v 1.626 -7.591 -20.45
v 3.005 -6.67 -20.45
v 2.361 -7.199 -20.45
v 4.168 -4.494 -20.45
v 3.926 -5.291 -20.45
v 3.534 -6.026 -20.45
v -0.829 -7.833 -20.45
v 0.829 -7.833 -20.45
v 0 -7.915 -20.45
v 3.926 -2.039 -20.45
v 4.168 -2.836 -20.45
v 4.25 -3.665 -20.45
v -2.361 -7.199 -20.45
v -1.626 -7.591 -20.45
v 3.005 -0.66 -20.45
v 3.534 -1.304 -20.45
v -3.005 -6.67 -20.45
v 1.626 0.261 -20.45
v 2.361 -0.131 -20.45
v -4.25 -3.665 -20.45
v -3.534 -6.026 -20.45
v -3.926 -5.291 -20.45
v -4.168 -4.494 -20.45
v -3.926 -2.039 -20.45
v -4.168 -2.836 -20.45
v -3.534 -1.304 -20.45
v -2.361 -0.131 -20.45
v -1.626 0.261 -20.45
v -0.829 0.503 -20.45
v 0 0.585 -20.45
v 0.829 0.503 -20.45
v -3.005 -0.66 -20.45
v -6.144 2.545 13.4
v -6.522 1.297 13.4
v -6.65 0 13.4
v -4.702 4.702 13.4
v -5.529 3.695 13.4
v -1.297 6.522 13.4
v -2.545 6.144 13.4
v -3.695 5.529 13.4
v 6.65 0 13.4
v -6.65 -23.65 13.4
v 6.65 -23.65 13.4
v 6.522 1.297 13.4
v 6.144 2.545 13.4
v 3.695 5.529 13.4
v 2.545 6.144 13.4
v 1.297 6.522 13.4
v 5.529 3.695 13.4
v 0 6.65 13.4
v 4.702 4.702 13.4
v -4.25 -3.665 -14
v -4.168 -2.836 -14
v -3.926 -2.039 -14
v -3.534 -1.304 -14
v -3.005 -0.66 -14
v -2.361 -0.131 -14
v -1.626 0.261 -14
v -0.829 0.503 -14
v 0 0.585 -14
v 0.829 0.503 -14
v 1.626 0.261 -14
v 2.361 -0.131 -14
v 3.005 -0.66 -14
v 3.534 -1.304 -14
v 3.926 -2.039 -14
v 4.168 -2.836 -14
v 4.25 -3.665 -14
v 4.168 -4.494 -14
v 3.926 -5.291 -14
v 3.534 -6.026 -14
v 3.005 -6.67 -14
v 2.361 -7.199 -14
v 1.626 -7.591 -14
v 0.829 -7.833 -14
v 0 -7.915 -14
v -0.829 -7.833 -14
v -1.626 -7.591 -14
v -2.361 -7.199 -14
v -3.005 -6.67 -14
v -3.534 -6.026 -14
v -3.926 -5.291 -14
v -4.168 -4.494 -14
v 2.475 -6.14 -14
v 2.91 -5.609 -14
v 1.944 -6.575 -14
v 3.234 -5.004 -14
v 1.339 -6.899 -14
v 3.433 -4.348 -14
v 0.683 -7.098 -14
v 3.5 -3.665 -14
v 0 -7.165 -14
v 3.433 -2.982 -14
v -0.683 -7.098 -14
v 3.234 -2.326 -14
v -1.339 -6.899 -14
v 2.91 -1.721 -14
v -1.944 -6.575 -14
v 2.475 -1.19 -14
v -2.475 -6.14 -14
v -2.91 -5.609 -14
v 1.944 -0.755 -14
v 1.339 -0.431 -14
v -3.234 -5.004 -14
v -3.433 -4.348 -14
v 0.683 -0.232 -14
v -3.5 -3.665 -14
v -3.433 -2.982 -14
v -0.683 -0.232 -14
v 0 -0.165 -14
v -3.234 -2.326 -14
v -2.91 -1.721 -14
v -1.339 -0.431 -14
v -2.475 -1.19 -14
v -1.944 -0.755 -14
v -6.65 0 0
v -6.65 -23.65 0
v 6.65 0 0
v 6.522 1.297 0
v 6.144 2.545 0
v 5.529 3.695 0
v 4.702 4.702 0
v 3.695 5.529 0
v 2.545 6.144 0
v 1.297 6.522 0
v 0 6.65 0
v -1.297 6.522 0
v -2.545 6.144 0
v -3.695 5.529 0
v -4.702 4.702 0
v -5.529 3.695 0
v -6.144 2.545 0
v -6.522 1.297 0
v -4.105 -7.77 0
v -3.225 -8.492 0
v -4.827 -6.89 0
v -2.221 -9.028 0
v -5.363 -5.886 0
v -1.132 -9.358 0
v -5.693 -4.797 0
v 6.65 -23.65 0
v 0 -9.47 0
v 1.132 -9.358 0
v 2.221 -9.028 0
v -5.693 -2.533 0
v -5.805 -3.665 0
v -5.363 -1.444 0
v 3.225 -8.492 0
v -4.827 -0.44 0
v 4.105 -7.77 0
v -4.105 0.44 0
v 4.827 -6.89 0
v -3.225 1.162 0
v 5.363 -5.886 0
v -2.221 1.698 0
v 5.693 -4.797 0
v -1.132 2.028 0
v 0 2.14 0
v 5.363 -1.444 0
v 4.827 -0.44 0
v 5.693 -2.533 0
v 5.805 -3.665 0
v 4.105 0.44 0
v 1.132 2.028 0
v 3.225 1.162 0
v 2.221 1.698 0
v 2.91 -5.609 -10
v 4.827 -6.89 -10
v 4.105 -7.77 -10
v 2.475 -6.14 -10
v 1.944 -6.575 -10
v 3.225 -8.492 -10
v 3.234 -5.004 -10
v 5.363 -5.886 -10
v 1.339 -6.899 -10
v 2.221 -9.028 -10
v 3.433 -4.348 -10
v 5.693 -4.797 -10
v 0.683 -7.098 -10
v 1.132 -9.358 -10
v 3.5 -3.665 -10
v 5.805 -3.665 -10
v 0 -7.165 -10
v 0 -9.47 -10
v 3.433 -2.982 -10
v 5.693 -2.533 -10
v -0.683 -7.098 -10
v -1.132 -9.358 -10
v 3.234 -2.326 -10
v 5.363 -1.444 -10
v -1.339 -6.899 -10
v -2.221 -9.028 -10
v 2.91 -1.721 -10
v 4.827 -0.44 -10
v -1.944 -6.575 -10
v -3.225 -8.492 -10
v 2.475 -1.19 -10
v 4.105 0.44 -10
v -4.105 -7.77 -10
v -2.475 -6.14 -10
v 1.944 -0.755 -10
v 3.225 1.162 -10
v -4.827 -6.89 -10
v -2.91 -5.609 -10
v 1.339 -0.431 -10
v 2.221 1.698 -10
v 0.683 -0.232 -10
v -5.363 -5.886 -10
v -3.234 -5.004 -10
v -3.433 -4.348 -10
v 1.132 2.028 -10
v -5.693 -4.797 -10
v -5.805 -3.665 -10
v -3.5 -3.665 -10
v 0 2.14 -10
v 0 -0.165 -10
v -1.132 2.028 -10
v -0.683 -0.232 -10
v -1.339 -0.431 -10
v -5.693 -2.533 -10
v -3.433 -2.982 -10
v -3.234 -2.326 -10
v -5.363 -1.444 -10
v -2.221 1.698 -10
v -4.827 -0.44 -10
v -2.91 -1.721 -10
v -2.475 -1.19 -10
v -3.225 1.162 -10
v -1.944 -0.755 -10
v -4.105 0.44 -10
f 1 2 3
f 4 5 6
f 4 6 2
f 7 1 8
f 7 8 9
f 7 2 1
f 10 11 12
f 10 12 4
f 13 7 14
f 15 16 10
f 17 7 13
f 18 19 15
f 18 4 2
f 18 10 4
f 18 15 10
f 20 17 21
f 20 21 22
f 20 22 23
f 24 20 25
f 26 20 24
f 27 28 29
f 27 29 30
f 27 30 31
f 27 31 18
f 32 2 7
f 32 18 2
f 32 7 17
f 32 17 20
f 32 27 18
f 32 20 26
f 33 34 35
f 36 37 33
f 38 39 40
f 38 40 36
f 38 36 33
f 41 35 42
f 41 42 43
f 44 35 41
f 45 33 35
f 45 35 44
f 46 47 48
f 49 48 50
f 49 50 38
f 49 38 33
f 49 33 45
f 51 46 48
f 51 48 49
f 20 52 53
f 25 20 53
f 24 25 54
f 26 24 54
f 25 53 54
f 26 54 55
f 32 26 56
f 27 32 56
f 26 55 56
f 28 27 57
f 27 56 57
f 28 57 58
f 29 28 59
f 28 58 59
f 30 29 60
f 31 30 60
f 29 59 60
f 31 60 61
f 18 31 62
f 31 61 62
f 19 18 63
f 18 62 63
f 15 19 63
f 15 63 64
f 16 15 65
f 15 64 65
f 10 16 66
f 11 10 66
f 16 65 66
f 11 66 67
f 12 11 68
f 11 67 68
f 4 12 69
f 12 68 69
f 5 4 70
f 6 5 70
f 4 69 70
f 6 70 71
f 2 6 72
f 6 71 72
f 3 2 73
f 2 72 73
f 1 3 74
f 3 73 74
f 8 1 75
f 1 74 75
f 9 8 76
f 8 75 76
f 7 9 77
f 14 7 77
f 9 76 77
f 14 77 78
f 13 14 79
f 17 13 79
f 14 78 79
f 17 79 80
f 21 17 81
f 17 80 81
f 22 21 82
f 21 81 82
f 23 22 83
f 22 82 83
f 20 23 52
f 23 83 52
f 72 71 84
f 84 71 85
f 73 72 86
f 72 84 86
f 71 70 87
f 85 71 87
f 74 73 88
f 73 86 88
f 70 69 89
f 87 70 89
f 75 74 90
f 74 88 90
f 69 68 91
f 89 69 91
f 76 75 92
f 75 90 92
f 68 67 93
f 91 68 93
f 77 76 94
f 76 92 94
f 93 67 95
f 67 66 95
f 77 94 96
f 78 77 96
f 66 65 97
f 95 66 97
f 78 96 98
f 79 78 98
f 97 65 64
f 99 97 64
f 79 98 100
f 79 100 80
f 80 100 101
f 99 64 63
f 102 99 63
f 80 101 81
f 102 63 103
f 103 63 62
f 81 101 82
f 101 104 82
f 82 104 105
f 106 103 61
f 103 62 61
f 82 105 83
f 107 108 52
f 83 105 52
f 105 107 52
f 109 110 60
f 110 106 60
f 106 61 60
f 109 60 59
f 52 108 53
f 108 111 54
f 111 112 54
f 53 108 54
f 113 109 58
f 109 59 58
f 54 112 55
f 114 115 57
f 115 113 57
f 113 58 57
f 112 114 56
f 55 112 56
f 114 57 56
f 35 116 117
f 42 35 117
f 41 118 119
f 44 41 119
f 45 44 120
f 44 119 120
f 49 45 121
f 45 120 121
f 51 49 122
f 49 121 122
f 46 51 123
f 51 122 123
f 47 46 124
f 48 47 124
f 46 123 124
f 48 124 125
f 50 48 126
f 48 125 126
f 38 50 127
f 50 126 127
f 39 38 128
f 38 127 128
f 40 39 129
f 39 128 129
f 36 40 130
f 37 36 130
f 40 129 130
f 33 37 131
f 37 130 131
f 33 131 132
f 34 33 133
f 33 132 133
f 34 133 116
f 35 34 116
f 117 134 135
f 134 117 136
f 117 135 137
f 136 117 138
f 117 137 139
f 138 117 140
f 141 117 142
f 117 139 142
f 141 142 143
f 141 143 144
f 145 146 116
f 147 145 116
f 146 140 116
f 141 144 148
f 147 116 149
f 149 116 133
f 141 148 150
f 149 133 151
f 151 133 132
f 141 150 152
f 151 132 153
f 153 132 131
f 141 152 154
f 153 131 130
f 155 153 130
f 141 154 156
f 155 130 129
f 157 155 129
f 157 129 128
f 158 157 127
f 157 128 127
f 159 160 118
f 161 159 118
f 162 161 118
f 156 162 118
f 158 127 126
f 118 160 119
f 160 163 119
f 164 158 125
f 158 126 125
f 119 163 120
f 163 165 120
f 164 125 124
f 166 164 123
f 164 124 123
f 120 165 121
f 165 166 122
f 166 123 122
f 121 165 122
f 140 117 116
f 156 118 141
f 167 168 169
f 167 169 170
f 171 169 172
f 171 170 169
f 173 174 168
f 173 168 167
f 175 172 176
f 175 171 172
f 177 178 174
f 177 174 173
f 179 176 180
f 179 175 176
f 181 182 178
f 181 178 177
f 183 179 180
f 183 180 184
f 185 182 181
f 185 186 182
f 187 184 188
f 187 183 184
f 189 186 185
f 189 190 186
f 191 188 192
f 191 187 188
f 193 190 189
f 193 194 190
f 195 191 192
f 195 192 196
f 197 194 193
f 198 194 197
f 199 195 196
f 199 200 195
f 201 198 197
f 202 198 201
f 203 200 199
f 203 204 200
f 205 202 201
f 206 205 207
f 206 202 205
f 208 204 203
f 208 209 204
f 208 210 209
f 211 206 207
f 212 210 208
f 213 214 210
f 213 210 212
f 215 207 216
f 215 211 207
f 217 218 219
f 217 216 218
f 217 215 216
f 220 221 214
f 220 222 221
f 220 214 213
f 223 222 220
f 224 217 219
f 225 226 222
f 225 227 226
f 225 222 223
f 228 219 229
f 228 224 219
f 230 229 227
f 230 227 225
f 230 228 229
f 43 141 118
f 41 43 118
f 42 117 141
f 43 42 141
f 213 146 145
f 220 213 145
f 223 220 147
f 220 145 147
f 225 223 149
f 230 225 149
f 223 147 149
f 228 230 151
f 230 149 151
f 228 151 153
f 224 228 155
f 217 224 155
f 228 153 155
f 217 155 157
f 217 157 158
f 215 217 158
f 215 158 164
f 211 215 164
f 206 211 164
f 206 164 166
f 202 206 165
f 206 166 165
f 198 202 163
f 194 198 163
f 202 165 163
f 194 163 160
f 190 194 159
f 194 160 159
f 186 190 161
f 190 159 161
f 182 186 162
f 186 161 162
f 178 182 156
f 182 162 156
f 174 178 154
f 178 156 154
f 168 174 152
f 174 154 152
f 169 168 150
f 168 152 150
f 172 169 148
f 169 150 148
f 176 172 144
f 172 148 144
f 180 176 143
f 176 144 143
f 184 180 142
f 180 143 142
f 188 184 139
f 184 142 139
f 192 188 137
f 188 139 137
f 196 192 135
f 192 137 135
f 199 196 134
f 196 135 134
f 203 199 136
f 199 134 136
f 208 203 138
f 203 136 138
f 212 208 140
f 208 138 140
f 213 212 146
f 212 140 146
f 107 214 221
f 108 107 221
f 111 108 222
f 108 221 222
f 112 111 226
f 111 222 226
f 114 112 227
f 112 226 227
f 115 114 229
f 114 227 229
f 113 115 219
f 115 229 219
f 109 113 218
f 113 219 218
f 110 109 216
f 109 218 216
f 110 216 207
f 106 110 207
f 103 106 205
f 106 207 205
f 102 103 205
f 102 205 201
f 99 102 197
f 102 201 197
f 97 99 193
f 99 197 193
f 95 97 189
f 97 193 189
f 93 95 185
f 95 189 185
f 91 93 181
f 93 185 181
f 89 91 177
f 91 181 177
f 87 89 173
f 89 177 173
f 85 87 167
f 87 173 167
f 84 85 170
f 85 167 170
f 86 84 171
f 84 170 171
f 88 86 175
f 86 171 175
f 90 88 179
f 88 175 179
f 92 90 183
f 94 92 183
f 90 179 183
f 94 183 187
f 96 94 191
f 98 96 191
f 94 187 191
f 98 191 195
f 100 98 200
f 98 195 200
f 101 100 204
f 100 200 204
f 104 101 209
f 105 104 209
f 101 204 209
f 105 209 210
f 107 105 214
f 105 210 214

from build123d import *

# Parameters (mm, degrees)
BOSS_EXTRU_1_DEPTH = 13.4
ESQUISSE2_R        = 5.805
BOSS_EXTRU_2_DEPTH = 10
ESQUISSE3_R        = 3.5
BOSS_EXTRU_3_DEPTH = 4
ESQUISSE4_R        = 4.25
BOSS_EXTRU_4_DEPTH = 6.45


with BuildPart() as part:
    # Esquisse1 → Boss.-Extru.1 (new body)
    with BuildSketch(Plane.XY):
        with BuildLine():
            Line((-6.65, 0), (-6.65, -23.65))
            Line((-6.65, -23.65), (6.65, -23.65))
            Line((6.65, -23.65), (6.65, 0))
            ThreePointArc((6.65, 0), (0, 6.65), (-6.65, 0))
        make_face()
    extrude(amount=BOSS_EXTRU_1_DEPTH)

    # Esquisse2 → Boss.-Extru.2 (add)
    with BuildSketch(Plane(origin=(0, 0, 0), x_dir=(-1, 0, 0), z_dir=(0, 0, -1))):
        with Locations((0, -3.665)):
            Circle(ESQUISSE2_R)
    extrude(amount=BOSS_EXTRU_2_DEPTH)

    # Esquisse3 → Boss.-Extru.3 (add)
    with BuildSketch(Plane(origin=(0, 0, -10), x_dir=(-1, 0, 0), z_dir=(0, 0, -1))):
        with Locations((0, -3.665)):
            Circle(ESQUISSE3_R)
    extrude(amount=BOSS_EXTRU_3_DEPTH)

    # Esquisse4 → Boss.-Extru.4 (add)
    with BuildSketch(Plane(origin=(0, 0, -14), x_dir=(-1, 0, 0), z_dir=(0, 0, -1))):
        with Locations((0, -3.665)):
            Circle(ESQUISSE4_R)
    extrude(amount=BOSS_EXTRU_4_DEPTH)


solid = part.part
